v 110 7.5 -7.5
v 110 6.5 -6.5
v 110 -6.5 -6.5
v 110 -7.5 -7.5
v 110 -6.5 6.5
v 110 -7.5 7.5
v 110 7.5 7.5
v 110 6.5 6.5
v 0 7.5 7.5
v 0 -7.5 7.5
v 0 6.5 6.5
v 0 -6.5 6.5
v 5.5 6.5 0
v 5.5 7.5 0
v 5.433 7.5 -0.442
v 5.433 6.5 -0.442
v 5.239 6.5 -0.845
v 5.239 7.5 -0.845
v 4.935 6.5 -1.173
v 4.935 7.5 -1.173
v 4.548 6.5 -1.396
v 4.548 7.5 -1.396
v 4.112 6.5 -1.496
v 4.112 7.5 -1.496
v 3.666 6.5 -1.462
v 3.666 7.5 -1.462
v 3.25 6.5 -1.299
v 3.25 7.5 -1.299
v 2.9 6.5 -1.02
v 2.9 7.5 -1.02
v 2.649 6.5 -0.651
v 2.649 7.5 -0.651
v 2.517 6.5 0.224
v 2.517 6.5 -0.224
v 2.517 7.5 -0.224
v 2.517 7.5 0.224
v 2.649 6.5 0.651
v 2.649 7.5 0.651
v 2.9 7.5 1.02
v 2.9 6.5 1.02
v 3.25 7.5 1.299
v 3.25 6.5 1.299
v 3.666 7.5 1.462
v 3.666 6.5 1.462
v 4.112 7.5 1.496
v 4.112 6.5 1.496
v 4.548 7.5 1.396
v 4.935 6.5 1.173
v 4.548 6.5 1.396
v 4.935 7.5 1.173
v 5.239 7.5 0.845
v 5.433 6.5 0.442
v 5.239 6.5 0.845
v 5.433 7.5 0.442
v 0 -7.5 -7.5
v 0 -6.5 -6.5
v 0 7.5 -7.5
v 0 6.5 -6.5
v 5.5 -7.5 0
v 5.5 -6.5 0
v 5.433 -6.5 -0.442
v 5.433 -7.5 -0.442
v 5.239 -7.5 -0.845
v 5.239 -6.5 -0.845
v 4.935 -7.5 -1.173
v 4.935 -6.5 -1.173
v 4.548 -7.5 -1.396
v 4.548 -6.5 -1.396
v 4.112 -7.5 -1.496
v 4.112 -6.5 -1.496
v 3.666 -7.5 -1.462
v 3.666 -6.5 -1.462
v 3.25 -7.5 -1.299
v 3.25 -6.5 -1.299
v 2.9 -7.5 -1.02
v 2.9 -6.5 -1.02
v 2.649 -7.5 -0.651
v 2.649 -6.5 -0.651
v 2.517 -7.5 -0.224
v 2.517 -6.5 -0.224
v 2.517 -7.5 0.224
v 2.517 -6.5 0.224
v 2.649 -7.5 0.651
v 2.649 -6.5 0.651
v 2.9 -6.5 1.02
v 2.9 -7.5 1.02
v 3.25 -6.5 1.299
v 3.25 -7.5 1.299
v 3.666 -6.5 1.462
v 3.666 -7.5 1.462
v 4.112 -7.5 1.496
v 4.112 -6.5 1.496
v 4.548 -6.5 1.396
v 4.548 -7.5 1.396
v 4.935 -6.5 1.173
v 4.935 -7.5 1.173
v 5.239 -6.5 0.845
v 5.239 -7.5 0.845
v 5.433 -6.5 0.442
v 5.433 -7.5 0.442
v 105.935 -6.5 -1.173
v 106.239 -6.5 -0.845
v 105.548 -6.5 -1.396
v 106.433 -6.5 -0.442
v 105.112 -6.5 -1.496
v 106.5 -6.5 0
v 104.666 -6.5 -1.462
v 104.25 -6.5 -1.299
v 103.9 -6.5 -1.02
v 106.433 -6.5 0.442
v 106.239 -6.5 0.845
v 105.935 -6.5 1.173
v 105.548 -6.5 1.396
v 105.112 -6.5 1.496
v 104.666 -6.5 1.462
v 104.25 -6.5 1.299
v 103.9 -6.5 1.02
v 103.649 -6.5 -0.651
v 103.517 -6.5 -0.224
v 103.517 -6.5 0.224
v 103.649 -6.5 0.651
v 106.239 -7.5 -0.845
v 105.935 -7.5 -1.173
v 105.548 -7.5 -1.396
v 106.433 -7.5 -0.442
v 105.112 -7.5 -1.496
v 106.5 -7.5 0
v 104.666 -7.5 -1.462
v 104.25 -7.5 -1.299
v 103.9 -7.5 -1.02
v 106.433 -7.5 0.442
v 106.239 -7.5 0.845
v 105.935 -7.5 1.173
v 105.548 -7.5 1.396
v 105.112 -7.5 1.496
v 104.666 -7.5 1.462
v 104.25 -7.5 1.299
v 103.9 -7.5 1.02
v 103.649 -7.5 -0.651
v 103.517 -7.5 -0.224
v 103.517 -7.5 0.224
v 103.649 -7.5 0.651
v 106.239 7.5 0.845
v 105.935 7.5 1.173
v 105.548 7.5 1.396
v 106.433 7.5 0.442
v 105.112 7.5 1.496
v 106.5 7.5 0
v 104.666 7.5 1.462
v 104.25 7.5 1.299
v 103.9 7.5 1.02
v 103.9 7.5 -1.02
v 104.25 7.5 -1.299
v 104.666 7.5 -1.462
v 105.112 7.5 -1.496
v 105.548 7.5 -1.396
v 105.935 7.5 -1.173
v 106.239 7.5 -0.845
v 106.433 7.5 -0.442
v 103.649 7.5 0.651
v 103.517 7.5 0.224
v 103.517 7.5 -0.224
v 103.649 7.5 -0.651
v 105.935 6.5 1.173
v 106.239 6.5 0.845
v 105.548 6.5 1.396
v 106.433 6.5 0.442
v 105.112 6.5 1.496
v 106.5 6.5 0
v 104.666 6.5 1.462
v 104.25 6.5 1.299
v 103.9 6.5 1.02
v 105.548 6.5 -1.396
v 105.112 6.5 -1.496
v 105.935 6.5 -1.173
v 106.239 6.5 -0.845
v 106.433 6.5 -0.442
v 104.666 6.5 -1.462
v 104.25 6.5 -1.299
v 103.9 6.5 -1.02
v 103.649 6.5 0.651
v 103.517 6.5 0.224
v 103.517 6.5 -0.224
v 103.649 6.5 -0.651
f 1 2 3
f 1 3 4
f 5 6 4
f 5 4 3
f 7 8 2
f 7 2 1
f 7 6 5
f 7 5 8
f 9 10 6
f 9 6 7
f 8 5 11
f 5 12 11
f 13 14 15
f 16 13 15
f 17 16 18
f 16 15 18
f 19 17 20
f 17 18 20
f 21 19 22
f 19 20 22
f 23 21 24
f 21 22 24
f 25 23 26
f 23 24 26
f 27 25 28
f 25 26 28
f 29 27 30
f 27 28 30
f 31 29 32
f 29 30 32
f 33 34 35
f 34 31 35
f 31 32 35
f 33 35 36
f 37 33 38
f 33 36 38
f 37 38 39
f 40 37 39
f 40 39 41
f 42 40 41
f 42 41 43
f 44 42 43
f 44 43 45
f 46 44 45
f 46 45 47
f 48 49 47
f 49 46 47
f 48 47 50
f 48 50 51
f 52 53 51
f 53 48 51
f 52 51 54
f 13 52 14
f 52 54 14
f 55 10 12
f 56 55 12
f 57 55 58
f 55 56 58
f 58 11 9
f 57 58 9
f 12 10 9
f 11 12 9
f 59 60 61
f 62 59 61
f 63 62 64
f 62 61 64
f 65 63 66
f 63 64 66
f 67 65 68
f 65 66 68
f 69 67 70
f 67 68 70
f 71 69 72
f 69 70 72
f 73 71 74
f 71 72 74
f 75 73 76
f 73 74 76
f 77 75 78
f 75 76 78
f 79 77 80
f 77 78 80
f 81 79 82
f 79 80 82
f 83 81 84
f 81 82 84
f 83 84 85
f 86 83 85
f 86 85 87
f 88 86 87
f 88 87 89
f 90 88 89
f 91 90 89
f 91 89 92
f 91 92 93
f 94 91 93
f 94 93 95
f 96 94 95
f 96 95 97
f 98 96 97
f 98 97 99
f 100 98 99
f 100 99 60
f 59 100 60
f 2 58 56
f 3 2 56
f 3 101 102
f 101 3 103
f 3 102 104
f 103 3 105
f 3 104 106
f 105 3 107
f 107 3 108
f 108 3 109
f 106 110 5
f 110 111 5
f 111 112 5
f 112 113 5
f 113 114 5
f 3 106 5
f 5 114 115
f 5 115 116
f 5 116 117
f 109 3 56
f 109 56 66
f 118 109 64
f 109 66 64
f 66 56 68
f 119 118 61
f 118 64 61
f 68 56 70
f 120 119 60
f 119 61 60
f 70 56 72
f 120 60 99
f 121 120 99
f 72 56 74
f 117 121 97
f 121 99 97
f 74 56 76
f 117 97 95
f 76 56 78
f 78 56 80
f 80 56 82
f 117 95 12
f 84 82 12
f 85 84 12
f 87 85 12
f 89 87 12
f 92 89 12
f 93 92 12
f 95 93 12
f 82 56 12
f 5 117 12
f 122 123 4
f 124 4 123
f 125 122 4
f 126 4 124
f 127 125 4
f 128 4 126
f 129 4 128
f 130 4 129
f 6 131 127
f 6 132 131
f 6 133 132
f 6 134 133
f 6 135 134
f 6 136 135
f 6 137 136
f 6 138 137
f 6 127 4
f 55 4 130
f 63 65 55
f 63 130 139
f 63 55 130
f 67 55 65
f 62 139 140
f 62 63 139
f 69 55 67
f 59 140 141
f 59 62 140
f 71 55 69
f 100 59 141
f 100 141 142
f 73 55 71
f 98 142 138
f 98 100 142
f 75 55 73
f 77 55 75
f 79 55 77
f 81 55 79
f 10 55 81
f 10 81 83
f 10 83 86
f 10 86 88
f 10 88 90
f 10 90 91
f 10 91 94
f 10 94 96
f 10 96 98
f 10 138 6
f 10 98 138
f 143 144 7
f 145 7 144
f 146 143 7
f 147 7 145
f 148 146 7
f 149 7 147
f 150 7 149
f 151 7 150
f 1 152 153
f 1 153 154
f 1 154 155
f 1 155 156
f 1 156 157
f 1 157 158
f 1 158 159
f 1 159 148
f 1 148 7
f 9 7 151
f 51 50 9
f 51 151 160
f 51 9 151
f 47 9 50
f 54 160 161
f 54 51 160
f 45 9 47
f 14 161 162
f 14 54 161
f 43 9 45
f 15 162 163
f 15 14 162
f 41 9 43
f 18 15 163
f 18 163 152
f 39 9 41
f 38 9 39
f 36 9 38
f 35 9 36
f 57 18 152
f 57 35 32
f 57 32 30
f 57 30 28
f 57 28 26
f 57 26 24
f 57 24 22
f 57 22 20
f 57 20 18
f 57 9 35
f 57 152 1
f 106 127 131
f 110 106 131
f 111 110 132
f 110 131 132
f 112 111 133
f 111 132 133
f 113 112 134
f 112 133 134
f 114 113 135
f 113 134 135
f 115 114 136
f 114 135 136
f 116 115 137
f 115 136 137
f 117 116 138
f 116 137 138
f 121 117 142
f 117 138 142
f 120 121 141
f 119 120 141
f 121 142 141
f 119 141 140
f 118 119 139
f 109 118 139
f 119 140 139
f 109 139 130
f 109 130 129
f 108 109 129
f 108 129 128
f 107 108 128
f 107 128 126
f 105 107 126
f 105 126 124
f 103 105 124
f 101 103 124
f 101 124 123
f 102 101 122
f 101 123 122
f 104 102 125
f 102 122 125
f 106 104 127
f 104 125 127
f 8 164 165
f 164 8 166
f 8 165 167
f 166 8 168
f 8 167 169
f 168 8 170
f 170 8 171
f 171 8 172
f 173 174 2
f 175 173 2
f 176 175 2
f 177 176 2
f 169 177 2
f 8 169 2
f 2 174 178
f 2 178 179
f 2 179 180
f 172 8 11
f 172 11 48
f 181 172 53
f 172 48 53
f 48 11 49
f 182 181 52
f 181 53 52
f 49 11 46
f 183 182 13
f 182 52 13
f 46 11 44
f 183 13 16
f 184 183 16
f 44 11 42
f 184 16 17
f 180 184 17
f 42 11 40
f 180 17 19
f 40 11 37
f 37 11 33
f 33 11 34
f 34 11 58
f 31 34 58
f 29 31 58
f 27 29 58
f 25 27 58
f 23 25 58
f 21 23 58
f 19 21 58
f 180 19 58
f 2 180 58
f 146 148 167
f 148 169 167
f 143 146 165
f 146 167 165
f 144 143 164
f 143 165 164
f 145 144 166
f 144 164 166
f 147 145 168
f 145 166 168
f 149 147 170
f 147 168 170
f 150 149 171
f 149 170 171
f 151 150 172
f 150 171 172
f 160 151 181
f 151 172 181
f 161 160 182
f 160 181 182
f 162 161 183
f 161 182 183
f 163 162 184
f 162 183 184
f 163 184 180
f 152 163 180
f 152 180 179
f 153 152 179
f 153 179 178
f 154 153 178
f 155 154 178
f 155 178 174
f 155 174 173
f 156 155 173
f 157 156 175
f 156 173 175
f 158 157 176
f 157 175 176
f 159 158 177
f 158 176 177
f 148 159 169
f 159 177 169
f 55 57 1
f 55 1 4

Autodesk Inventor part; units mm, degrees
ref_plane "YZ Plane" through (0, 0, 0) normal (1, 0, 0) x (0, 1, 0)
ref_plane "XZ Plane" through (0, 0, 0) normal (0, 1, 0) x (-1, 0, 0)
ref_plane "XY Plane" through (0, 0, 0) normal (0, 0, 1) x (1, 0, 0)
sketch "Sketch1" plane through (0, 0, 0) normal (1, 0, 0) x (0, 1, 0)
  line L0 (-7.5, 7.5) -> (7.5, 7.5)
  line L1 (7.5, 7.5) -> (7.5, -7.5)
  line L2 (7.5, -7.5) -> (-7.5, -7.5)
  line L3 (-7.5, -7.5) -> (-7.5, 7.5)
  line L4 (-7.5, 7.5) -> (7.5, -7.5) construction
  line L5 (7.5, 7.5) -> (-7.5, -7.5) construction
  line L6 (-6.5, 6.5) -> (6.5, 6.5)
  line L7 (6.5, 6.5) -> (6.5, -6.5)
  line L8 (6.5, -6.5) -> (-6.5, -6.5)
  line L9 (-6.5, -6.5) -> (-6.5, 6.5)
  line L10 (-6.5, 6.5) -> (6.5, -6.5) construction
  line L11 (6.5, 6.5) -> (-6.5, -6.5) construction
  point P0 (0, 0)
  dimension "d0" = 15
  dimension "d1" = 15
  dimension "d2" = 13
  dimension "d3" = 13
extrude "Extrusion1" add sketch "Sketch1" along normal blind 110
sketch "Sketch2" plane through (0, 7.5, 7.5) normal (0, 1, 0) x (1, 0, 0)
  line L0 (0, 7.5) -> (4, 7.5)
  circle A0 centre (4, 7.5) radius 1.5
  dimension "d6" = 4
  dimension "d7" = 3
extrude "Extrusion2" cut sketch "Sketch2" against normal through all
sketch "Sketch3" plane through (0, -7.5, -7.5) normal (0, -1, 0) x (1, 0, 0)
  line L0 (110, 1) -> (110, 14) projected
  line L1 (110, 7.5) -> (105, 7.5)
  circle A0 centre (105, 7.5) radius 1.5
  point P0 (0, 7.5)
  dimension "d10" = 5
  dimension "d11" = 3
extrude "Extrusion3" cut sketch "Sketch3" against normal through all
properties part number "front_arm_rect" material "Aluminum 6061"
